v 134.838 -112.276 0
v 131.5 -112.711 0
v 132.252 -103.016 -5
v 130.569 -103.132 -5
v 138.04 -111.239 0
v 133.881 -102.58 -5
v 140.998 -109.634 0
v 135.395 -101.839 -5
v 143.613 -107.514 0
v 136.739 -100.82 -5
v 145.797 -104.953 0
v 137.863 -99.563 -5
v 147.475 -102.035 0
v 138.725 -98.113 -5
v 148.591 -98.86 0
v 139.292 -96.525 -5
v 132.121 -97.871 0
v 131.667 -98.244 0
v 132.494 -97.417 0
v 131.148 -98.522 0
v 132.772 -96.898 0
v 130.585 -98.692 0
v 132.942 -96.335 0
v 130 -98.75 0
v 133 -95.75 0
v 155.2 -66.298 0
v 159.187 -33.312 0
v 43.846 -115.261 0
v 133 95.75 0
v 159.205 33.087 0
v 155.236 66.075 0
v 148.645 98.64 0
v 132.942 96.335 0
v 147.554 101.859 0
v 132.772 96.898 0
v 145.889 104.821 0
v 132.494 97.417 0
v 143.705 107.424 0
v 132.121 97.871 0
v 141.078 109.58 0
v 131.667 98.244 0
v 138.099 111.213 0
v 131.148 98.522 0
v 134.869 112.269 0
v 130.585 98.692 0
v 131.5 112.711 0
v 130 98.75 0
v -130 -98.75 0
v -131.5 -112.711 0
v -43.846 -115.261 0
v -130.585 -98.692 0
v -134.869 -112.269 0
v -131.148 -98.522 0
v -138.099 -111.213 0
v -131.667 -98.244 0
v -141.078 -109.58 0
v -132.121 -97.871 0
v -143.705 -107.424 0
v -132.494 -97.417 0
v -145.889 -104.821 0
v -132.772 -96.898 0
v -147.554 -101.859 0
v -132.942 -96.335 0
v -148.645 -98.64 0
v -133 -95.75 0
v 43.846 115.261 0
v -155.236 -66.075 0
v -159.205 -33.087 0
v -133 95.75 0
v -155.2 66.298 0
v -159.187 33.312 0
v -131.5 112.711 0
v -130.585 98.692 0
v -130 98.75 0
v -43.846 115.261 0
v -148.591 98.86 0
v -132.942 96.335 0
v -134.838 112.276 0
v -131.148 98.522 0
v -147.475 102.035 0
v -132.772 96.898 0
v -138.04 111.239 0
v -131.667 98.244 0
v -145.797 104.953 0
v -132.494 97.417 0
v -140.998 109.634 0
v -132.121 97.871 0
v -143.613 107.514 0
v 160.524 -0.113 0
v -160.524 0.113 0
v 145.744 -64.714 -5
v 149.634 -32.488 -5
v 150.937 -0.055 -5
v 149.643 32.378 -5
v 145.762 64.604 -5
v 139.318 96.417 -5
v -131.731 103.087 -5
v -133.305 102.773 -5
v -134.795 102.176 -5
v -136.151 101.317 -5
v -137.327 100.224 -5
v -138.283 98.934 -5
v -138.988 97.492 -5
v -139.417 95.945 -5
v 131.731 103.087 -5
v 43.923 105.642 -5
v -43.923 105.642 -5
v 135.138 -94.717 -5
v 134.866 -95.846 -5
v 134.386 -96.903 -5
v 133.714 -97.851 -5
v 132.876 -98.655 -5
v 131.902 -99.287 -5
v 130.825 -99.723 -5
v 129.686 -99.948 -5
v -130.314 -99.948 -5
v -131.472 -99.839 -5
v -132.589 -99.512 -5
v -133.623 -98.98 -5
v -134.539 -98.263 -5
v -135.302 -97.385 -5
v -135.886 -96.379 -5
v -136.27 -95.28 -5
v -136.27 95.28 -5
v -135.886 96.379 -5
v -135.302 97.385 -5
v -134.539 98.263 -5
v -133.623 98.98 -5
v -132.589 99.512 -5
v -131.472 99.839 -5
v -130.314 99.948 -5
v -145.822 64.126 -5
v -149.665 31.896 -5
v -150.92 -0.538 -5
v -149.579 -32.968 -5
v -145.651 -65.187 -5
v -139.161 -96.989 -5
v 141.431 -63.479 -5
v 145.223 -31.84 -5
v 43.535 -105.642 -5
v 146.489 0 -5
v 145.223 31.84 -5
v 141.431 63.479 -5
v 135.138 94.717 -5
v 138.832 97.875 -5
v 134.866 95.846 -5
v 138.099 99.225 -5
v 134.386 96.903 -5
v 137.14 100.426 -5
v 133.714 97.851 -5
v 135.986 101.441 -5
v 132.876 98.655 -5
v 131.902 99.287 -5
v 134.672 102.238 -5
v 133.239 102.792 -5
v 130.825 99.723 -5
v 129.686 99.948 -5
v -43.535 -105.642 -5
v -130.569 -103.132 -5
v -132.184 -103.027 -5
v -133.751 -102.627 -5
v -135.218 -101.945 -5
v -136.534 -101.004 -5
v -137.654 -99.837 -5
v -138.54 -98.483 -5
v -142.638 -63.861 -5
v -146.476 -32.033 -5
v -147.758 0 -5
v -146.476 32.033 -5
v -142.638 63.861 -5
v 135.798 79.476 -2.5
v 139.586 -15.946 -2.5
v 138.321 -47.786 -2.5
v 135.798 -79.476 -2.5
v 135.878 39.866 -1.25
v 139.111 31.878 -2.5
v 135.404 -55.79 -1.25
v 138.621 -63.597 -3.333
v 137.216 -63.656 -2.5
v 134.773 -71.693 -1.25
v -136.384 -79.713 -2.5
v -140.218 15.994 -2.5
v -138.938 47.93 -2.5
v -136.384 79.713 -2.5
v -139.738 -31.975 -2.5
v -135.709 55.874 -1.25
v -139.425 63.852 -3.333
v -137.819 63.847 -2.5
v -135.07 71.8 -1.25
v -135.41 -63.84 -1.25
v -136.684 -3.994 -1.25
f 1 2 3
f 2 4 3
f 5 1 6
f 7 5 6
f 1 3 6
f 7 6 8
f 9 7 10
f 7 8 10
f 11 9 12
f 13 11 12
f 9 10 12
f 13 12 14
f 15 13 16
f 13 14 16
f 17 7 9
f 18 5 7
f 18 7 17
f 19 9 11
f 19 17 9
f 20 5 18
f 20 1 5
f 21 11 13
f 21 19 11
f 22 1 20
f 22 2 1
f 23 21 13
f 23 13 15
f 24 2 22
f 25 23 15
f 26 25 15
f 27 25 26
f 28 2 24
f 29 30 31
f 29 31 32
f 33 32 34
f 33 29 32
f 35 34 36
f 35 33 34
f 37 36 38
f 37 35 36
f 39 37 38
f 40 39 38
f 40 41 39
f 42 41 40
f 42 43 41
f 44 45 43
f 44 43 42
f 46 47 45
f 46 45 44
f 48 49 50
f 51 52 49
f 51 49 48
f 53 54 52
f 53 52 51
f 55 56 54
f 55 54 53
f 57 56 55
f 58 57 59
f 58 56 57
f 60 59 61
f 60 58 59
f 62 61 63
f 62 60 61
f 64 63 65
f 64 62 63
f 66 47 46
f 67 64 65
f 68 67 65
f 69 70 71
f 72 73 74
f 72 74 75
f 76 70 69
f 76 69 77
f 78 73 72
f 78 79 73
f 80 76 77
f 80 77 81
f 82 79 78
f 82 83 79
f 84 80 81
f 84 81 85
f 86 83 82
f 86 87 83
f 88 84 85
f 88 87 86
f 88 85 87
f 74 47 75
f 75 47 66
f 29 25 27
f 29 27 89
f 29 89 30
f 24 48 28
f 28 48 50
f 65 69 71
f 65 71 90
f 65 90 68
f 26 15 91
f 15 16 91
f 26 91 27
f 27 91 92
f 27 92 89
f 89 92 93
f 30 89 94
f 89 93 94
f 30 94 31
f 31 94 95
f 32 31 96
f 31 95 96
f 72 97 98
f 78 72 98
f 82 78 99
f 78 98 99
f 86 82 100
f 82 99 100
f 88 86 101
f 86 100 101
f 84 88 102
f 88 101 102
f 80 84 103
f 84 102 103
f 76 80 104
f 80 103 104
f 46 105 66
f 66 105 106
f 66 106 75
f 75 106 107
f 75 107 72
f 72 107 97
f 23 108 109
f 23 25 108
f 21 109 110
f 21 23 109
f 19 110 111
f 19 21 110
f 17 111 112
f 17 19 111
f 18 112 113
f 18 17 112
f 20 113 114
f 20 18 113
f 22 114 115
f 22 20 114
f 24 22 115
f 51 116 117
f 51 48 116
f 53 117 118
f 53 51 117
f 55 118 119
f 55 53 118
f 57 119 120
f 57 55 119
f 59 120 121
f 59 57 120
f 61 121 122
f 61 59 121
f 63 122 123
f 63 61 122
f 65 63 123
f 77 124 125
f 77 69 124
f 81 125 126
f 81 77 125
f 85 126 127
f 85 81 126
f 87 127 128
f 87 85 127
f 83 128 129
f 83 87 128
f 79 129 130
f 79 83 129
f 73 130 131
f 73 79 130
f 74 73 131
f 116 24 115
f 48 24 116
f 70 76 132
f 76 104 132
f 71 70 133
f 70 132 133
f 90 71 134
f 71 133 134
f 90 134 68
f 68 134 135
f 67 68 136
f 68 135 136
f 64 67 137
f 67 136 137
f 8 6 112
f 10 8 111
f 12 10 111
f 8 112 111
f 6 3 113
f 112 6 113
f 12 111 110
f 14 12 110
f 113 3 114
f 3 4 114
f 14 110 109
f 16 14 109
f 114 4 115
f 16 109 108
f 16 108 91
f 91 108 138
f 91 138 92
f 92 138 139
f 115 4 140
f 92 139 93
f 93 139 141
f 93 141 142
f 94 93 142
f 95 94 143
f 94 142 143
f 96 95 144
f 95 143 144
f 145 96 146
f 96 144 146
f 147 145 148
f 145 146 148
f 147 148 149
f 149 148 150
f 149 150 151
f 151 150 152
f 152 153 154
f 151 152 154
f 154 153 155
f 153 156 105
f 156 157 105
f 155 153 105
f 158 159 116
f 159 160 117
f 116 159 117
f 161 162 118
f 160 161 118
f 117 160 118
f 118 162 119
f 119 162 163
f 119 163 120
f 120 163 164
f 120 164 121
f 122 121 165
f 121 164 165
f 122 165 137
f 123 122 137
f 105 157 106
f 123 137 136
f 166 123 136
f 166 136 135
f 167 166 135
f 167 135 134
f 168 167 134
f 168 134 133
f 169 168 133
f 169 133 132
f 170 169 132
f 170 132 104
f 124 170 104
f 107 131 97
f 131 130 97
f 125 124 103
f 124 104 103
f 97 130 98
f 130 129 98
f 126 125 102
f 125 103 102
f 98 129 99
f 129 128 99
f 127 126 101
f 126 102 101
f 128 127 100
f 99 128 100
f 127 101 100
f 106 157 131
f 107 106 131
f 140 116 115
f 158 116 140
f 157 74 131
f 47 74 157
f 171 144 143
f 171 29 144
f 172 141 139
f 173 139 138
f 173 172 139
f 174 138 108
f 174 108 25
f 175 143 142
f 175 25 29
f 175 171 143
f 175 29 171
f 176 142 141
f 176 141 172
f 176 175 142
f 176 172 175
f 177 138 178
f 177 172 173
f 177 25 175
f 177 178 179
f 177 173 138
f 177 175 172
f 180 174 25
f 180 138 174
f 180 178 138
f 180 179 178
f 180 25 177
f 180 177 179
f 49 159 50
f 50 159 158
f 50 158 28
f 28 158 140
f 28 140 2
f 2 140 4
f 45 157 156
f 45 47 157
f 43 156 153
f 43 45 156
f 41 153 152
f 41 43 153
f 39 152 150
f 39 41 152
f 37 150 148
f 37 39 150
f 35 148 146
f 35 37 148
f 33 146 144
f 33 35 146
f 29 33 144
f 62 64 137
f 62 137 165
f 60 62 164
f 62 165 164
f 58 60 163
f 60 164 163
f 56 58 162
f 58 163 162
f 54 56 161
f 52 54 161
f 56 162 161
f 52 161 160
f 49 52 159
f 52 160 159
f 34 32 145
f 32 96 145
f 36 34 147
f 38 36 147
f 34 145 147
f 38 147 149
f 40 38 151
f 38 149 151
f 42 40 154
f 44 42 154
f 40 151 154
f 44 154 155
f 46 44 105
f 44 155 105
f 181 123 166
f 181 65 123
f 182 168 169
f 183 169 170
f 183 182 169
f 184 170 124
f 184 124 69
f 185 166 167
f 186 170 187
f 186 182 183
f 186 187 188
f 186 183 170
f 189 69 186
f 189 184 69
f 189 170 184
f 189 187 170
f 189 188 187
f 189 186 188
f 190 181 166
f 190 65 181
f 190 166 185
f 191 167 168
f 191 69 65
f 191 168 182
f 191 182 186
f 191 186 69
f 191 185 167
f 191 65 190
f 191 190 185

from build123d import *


with BuildPart() as case_chamfer_front_inner:
    # Sketch037 → Loft section 0
    with BuildSketch(Plane.XY.offset(-5)):
        with BuildLine():
            Line((-130.31395, 99.948372), (129.68605, 99.948372))
            ThreePointArc((135.138459, 94.717101), (133.314437, 98.273056), (129.68605, 99.948372))
            ThreePointArc((135.138459, -94.717101), (146.489063, 0), (135.138459, 94.717101))
            ThreePointArc((129.68605, -99.948372), (133.314437, -98.273056), (135.138459, -94.717101))
            Line((-130.31395, -99.948372), (129.68605, -99.948372))
            ThreePointArc((-136.26956, -95.280427), (-134.098255, -98.643375), (-130.31395, -99.948372))
            ThreePointArc((-136.26956, 95.280427), (-147.757578, 0), (-136.26956, -95.280427))
            ThreePointArc((-130.31395, 99.948372), (-134.098255, 98.643375), (-136.26956, 95.280427))
        make_face()
    # Sketch038 → Loft section 1
    with BuildSketch(Plane.XY):
        with BuildLine():
            Line((-130, 98.75), (130, 98.75))
            ThreePointArc((133, 95.75), (132.12132, 97.87132), (130, 98.75))
            Line((133, 95.75), (133, -95.75))
            ThreePointArc((130, -98.75), (132.12132, -97.87132), (133, -95.75))
            Line((130, -98.75), (-130, -98.75))
            ThreePointArc((-133, -95.75), (-132.12132, -97.87132), (-130, -98.75))
            Line((-133, -95.75), (-133, 95.75))
            ThreePointArc((-130, 98.75), (-132.12132, 97.87132), (-133, 95.75))
        make_face()
    loft()


with BuildPart() as case_chamfer:
    # Sketch035 → Loft001 section 0
    with BuildSketch(Plane.XY):
        with BuildLine():
            ThreePointArc((131.5, 112.710757), (0, 115.580098), (-131.5, 112.710757))
            ThreePointArc((-131.5, 112.710757), (-142.354422, 108.63407), (-148.591078, 98.859511))
            ThreePointArc((-148.591078, 98.859511), (-160.524221, 0.112742), (-148.644672, -98.640489))
            ThreePointArc((-148.644672, -98.640489), (-142.441793, -108.562815), (-131.5, -112.710757))
            ThreePointArc((-131.5, -112.710757), (0, -115.580098), (131.5, -112.710757))
            ThreePointArc((131.5, -112.710757), (142.354422, -108.63407), (148.591078, -98.859511))
            ThreePointArc((148.591078, -98.859511), (160.524221, -0.112742), (148.644672, 98.640489))
            ThreePointArc((148.644672, 98.640489), (142.441793, 108.562815), (131.5, 112.710757))
        make_face()
    # Sketch036 → Loft001 section 1
    with BuildSketch(Plane.XY.offset(-5)):
        with BuildLine():
            ThreePointArc((131.730833, 103.087267), (0, 105.961644), (-131.730833, 103.087267))
            ThreePointArc((-131.730833, 103.087267), (-136.764296, 100.797276), (-139.416641, 95.944969))
            ThreePointArc((-139.416641, 95.944969), (-150.91996, -0.537641), (-139.161062, -96.989436))
            ThreePointArc((-139.161062, -96.989436), (-135.897713, -101.504856), (-130.569459, -103.132176))
            ThreePointArc((-130.569459, -103.132176), (0, -105.956071), (130.569459, -103.132176))
            ThreePointArc((130.569459, -103.132176), (136.091991, -101.361862), (139.29156, -96.525011))
            ThreePointArc((139.29156, -96.525011), (150.936804, -0.055422), (139.317907, 96.417344))
            ThreePointArc((139.317907, 96.417344), (136.585275, 100.959091), (131.730833, 103.087267))
        make_face()
    loft()

    # Cut001: cut CASE_chamfer_front_inner
    add(case_chamfer_front_inner.part, mode=Mode.SUBTRACT)


solid = case_chamfer.part
